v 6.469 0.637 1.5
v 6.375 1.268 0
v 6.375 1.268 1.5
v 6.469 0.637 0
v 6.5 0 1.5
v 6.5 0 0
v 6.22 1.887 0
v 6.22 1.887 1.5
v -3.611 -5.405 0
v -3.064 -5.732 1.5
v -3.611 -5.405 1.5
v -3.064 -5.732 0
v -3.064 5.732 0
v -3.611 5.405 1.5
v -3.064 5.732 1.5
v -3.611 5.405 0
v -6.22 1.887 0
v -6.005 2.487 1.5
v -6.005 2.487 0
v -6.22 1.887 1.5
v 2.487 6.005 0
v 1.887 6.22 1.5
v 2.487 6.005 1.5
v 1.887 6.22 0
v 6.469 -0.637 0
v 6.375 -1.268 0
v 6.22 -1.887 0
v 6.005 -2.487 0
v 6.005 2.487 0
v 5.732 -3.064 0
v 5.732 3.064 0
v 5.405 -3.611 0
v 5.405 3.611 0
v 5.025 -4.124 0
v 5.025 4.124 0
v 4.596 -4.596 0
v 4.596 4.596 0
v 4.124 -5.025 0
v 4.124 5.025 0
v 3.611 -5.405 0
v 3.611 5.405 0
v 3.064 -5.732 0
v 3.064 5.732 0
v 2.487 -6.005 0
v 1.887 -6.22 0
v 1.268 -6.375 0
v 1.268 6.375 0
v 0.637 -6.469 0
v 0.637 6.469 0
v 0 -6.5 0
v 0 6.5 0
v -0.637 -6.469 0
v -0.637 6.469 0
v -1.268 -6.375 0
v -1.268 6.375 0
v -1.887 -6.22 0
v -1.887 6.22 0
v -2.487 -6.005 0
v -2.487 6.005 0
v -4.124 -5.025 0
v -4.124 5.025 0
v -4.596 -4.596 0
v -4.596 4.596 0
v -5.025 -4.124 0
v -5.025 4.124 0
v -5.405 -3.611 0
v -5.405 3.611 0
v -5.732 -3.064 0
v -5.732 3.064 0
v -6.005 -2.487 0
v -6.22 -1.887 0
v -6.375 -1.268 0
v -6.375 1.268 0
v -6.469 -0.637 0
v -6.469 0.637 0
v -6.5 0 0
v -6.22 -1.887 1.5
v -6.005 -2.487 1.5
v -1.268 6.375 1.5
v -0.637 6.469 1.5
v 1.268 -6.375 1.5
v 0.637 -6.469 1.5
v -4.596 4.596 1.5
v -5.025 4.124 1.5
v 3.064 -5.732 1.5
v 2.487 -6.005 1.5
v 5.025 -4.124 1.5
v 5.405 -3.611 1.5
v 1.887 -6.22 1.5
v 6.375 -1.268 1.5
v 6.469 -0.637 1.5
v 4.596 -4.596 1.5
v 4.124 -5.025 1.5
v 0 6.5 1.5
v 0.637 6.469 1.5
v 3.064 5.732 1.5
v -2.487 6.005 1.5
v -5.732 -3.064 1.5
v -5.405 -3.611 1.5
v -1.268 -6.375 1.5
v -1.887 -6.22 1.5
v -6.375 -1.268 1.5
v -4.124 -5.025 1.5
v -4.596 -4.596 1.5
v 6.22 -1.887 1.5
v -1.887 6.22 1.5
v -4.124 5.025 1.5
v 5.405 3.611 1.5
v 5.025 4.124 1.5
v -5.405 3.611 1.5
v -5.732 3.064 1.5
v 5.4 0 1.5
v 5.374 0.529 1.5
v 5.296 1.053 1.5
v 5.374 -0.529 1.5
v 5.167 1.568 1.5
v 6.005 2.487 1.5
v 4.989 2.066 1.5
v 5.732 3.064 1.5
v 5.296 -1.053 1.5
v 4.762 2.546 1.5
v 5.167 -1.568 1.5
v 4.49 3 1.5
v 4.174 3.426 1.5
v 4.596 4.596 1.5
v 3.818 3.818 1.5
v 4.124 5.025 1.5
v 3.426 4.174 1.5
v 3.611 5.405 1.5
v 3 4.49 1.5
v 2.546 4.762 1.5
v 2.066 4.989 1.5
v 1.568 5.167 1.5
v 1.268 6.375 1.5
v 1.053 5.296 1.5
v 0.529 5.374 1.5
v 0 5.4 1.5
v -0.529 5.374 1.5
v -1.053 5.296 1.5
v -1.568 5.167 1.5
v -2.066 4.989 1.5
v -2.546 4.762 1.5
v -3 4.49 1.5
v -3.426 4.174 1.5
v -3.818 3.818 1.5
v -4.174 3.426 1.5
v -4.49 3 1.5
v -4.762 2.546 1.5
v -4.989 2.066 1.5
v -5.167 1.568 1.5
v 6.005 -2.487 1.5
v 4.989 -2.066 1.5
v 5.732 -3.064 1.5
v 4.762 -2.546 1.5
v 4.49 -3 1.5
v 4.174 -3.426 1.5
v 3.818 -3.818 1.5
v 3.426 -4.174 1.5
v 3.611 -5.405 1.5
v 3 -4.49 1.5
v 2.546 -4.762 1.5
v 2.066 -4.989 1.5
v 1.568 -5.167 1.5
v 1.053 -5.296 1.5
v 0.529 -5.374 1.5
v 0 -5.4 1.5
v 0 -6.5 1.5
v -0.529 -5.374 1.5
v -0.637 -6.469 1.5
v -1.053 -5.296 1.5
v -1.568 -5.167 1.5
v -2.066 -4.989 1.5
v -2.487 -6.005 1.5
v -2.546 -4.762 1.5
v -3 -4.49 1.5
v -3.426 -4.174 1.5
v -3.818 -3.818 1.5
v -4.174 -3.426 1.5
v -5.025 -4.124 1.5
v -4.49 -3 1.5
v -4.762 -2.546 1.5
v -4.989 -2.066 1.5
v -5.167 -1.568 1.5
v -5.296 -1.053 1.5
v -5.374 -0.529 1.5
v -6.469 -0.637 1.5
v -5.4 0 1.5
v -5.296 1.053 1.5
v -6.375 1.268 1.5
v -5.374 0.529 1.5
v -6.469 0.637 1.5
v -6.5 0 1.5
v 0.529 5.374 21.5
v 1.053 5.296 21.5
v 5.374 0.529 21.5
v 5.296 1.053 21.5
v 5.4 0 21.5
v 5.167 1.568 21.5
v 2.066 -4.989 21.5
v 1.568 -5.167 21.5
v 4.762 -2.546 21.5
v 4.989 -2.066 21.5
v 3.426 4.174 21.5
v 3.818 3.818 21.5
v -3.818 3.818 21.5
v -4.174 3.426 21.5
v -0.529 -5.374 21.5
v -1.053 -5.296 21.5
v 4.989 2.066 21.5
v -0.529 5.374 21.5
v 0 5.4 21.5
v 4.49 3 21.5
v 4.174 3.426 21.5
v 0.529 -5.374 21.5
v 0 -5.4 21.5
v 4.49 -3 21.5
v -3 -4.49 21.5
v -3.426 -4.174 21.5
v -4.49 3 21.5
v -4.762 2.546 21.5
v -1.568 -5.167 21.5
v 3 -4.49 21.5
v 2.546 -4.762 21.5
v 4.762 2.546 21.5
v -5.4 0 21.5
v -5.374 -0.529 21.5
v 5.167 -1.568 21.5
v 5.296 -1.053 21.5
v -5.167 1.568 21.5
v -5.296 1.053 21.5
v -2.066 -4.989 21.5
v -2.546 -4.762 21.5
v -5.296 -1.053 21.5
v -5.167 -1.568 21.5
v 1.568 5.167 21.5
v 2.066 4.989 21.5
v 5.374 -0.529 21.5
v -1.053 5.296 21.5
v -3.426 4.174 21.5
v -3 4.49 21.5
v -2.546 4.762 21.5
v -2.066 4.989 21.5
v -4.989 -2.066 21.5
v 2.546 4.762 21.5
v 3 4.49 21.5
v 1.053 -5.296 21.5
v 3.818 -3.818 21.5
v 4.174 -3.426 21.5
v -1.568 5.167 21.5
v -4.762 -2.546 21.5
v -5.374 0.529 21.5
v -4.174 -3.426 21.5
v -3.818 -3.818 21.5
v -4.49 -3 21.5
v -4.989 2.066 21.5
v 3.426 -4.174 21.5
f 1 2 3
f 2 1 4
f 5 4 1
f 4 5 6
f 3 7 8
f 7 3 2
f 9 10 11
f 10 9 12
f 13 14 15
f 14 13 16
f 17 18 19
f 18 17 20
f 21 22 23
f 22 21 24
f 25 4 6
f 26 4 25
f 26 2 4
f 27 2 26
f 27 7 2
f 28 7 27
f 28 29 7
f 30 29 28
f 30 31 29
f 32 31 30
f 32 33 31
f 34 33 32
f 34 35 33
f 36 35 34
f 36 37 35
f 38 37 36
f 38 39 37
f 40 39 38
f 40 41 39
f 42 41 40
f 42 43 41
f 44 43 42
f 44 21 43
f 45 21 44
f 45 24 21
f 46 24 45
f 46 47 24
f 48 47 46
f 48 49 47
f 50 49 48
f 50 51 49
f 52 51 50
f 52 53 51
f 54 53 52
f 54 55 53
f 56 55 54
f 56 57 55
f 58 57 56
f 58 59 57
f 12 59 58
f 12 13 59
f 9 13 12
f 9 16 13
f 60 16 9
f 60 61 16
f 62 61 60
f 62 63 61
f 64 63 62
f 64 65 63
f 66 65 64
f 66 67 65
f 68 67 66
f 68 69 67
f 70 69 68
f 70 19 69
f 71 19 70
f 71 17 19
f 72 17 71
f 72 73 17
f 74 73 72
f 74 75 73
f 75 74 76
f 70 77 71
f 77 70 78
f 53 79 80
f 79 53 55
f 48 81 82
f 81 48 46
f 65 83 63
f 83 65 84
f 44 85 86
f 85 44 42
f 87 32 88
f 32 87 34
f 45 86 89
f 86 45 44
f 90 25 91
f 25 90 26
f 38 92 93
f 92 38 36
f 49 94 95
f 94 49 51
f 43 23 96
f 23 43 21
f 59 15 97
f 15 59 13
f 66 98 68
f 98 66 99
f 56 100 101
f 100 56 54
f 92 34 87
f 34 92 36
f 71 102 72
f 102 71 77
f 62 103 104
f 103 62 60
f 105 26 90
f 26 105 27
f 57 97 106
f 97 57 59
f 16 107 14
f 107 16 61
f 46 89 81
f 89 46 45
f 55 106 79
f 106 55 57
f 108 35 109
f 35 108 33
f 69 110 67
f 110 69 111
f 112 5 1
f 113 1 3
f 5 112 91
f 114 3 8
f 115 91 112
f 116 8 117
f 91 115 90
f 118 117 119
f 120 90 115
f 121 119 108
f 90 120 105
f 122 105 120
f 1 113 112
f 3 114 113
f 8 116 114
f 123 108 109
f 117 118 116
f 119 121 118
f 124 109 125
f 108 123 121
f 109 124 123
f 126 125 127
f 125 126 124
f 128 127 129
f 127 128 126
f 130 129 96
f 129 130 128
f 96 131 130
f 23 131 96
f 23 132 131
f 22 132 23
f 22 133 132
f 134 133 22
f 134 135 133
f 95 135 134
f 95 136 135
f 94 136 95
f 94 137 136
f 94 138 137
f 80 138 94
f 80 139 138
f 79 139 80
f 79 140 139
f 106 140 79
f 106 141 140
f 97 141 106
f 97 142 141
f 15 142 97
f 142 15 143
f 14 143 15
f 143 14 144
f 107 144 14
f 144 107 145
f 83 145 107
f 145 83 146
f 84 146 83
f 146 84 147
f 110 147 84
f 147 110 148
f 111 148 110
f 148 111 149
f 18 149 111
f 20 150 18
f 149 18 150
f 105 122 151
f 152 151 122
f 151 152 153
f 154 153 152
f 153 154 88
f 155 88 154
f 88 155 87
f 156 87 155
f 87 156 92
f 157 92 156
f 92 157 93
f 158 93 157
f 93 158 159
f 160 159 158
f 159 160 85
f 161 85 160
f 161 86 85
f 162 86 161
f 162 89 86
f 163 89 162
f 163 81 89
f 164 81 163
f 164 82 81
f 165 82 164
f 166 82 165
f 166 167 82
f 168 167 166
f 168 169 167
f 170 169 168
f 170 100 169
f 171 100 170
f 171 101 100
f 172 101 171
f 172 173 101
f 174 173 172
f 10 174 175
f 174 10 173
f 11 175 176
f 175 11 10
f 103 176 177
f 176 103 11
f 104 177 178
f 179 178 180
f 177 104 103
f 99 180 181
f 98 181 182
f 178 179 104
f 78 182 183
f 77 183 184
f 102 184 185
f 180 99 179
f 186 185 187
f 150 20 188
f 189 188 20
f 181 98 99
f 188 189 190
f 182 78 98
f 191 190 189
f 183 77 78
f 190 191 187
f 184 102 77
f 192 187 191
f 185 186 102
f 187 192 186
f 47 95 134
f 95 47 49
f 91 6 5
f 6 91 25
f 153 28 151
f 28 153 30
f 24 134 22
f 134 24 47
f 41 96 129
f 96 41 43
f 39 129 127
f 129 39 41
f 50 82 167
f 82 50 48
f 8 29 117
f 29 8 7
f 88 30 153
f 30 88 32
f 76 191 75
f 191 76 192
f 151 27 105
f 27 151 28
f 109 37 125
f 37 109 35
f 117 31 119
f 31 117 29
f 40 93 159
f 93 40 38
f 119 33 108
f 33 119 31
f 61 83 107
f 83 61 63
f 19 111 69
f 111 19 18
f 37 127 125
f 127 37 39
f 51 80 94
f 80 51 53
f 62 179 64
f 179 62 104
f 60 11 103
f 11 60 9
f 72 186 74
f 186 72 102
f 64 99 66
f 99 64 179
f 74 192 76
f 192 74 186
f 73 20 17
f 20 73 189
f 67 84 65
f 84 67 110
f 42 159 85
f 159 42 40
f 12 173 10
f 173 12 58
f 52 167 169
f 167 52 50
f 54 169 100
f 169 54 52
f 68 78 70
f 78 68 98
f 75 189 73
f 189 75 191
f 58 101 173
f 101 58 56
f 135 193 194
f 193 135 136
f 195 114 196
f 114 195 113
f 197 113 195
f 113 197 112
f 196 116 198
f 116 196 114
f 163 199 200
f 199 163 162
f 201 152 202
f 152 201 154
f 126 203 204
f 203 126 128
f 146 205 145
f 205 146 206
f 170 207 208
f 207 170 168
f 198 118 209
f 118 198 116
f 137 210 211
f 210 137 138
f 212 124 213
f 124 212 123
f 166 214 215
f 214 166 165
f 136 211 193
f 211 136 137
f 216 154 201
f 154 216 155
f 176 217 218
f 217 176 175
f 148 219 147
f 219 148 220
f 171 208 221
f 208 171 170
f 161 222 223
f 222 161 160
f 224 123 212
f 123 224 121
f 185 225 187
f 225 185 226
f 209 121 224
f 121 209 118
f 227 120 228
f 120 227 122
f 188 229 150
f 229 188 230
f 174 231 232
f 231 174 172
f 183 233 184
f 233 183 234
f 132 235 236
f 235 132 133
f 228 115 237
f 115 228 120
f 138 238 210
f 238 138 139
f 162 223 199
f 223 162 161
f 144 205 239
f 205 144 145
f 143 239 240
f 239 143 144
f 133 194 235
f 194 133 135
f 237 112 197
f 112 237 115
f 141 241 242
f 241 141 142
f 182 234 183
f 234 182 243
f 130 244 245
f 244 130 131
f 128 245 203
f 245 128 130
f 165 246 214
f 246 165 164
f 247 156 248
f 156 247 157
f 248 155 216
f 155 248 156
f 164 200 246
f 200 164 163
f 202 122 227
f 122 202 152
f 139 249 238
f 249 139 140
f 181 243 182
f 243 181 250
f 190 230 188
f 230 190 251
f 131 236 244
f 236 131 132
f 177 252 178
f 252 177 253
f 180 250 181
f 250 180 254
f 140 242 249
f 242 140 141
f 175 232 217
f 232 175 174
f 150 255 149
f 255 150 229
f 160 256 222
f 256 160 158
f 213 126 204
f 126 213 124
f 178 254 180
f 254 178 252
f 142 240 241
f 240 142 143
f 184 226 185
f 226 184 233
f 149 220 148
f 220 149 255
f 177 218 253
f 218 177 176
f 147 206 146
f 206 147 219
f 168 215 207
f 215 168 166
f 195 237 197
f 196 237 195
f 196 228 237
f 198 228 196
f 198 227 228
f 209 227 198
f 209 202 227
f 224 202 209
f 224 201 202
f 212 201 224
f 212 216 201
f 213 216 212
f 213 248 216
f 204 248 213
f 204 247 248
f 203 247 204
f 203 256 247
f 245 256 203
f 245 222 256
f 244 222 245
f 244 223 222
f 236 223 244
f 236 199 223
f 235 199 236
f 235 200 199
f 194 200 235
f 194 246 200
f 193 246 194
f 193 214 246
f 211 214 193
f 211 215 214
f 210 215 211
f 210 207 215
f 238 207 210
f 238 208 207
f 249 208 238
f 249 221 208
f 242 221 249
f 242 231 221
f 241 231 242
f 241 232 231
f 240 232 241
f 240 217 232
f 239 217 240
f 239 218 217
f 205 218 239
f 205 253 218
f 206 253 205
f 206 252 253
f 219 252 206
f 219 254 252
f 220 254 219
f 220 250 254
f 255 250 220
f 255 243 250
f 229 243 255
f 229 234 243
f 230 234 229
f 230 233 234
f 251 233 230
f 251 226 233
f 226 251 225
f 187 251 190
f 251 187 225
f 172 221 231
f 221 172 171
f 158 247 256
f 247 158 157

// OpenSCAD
$fn = 64;

        // Variables
        collar_od = 13;
        collar_h = 1.5;
        sleeve_od = 10.8;
        total_h = 21.5;
        bore_d = 6.2;
        cut_overhang = 0.1;

        // Main Body
        union() {
            // Collar
            cylinder(d=collar_od, h=collar_h, center=[0,0,0]);
            // Sleeve Body
            translate([0, 0, collar_h])
            cylinder(d=sleeve_od, h=total_h - collar_h, center=[0,0,0]);
        }
